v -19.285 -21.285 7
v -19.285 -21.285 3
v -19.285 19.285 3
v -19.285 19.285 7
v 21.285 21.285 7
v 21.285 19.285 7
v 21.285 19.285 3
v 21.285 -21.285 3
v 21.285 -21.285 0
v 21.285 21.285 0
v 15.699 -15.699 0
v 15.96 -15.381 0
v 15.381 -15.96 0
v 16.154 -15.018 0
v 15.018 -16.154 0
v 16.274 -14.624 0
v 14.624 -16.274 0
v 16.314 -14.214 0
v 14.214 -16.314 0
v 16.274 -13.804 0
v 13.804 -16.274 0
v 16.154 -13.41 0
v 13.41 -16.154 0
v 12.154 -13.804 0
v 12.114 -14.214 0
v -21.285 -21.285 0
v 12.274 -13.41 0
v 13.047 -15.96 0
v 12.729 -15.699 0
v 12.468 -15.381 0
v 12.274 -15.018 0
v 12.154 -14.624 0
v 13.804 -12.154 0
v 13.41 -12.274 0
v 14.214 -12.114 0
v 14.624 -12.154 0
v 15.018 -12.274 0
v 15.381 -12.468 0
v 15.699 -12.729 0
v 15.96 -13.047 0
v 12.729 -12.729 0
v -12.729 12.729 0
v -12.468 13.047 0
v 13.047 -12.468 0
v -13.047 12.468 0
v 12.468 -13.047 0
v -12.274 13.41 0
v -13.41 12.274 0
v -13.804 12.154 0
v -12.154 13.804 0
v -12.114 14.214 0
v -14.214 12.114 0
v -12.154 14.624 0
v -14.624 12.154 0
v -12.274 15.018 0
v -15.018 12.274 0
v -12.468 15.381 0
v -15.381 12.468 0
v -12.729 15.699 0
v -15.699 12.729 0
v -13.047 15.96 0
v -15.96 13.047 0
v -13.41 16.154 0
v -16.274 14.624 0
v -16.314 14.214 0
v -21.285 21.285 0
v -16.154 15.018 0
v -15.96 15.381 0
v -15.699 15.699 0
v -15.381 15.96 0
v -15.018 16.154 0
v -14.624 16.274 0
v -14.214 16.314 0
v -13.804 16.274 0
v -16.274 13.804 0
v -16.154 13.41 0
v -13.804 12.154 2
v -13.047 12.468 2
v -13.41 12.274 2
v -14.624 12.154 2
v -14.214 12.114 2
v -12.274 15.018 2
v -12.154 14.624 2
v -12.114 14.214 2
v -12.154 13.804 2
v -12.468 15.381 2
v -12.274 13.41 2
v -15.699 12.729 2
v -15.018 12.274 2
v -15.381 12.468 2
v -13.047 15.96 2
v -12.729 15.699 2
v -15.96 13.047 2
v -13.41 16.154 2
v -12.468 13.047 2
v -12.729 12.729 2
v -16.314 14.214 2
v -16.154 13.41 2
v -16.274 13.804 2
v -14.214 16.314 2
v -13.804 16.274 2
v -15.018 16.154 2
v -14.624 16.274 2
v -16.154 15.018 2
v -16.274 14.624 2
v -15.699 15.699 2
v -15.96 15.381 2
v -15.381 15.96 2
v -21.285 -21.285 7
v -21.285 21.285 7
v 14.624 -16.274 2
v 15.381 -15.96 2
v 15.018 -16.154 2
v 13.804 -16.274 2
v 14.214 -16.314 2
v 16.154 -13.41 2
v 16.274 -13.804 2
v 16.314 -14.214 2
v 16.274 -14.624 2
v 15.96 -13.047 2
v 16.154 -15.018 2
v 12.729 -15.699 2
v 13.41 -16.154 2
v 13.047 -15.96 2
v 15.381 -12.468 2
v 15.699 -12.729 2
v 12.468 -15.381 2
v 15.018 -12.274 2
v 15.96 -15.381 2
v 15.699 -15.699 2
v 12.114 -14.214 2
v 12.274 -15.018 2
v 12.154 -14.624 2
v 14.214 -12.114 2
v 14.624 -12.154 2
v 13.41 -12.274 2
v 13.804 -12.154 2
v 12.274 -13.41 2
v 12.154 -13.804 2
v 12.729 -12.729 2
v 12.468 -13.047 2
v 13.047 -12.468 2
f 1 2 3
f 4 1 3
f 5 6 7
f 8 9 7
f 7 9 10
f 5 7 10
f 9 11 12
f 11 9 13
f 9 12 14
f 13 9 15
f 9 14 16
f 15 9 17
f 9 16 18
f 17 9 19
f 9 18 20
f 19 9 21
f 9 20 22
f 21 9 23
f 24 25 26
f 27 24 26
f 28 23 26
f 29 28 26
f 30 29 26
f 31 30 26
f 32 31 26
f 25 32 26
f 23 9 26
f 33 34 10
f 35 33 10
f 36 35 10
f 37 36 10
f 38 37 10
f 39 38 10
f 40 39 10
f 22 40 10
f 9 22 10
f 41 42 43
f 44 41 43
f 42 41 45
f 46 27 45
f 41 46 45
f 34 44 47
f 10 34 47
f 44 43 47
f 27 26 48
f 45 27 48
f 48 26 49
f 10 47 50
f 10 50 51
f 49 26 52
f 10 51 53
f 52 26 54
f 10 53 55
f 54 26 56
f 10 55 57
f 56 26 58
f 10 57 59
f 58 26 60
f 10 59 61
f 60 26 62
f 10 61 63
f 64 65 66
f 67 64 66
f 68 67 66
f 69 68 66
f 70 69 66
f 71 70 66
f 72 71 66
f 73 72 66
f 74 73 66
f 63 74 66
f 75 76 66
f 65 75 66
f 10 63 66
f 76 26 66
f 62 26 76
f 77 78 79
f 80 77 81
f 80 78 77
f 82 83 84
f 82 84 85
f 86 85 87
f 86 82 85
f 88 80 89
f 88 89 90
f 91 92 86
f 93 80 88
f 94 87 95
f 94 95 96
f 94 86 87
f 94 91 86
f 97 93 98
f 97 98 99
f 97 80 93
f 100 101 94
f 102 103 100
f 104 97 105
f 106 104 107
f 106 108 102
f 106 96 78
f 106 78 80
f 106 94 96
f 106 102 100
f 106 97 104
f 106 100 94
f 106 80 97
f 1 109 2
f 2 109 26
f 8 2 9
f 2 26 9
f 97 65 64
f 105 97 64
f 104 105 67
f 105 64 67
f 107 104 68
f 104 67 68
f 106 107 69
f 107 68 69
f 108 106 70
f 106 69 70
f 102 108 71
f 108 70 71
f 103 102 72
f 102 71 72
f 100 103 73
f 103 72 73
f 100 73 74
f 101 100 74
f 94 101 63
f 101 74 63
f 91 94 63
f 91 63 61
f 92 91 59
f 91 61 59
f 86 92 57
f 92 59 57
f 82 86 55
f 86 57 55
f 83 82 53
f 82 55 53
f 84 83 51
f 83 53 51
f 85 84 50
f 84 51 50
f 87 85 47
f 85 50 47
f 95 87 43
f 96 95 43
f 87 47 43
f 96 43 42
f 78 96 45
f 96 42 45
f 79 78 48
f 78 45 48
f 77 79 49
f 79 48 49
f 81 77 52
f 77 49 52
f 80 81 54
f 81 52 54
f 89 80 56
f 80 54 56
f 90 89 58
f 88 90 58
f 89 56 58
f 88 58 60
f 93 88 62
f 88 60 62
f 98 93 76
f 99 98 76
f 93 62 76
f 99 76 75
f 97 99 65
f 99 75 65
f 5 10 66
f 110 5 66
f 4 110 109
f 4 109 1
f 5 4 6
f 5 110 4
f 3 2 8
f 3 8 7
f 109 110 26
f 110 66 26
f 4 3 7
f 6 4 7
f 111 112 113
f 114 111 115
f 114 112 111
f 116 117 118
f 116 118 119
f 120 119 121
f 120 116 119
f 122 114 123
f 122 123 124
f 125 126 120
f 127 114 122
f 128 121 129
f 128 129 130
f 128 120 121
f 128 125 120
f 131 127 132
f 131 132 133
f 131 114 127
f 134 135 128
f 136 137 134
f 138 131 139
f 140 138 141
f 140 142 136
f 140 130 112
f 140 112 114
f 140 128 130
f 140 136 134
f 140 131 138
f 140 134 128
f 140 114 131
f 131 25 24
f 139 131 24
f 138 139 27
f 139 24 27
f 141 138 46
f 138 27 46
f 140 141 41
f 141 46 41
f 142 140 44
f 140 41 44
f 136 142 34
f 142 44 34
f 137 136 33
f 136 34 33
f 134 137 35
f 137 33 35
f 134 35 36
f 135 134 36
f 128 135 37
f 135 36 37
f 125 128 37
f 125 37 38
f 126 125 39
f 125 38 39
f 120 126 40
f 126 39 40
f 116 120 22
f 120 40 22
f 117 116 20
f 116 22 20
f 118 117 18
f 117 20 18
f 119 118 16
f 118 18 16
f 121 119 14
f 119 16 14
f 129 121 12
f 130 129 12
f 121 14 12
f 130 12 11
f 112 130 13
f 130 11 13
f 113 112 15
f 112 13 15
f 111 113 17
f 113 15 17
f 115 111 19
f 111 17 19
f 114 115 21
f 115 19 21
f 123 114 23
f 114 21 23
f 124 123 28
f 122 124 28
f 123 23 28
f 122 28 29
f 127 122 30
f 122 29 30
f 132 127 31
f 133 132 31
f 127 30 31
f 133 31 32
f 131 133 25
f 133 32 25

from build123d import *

# Parameters (mm, degrees)
SKETCH1_W           = 42.57
SKETCH1_H           = 42.57
BOSS_EXTRUDE1_DEPTH = 3
BOSS_EXTRUDE2_DEPTH = 4
SKETCH3_R           = 2.1
CUT_EXTRUDE1_DEPTH  = 2


with BuildPart() as part:
    # Sketch1 → Boss-Extrude1 (new body)
    with BuildSketch(Plane(origin=(0, 0, 0), x_dir=(0, 1, 0), z_dir=(0, 0, 1))):
        Rectangle(SKETCH1_W, SKETCH1_H)
    extrude(amount=BOSS_EXTRUDE1_DEPTH)

    # Sketch2 → Boss-Extrude2 (add)
    with BuildSketch(Plane.XY.offset(3)):
        Polygon((21.285, 21.285), (-21.285, 21.285), (-21.285, -21.285), (-19.285, -21.285), (-19.285, 19.285), (21.285, 19.285), align=None)
    extrude(amount=BOSS_EXTRUDE2_DEPTH)

    # Sketch3 → Cut-Extrude1 (cut)
    with BuildSketch(Plane(origin=(0, 0, 0), x_dir=(1, 0, 0), z_dir=(0, 0, -1))):
        with Locations(Location((-14.213932188, -14.213932188, 0), (0, 0, 180))):
            Circle(SKETCH3_R)
        with Locations(Location((14.213932188, 14.213932188, 0), (0, 0, 180))):
            Circle(SKETCH3_R)
    extrude(amount=-CUT_EXTRUDE1_DEPTH, mode=Mode.SUBTRACT)


solid = part.part
